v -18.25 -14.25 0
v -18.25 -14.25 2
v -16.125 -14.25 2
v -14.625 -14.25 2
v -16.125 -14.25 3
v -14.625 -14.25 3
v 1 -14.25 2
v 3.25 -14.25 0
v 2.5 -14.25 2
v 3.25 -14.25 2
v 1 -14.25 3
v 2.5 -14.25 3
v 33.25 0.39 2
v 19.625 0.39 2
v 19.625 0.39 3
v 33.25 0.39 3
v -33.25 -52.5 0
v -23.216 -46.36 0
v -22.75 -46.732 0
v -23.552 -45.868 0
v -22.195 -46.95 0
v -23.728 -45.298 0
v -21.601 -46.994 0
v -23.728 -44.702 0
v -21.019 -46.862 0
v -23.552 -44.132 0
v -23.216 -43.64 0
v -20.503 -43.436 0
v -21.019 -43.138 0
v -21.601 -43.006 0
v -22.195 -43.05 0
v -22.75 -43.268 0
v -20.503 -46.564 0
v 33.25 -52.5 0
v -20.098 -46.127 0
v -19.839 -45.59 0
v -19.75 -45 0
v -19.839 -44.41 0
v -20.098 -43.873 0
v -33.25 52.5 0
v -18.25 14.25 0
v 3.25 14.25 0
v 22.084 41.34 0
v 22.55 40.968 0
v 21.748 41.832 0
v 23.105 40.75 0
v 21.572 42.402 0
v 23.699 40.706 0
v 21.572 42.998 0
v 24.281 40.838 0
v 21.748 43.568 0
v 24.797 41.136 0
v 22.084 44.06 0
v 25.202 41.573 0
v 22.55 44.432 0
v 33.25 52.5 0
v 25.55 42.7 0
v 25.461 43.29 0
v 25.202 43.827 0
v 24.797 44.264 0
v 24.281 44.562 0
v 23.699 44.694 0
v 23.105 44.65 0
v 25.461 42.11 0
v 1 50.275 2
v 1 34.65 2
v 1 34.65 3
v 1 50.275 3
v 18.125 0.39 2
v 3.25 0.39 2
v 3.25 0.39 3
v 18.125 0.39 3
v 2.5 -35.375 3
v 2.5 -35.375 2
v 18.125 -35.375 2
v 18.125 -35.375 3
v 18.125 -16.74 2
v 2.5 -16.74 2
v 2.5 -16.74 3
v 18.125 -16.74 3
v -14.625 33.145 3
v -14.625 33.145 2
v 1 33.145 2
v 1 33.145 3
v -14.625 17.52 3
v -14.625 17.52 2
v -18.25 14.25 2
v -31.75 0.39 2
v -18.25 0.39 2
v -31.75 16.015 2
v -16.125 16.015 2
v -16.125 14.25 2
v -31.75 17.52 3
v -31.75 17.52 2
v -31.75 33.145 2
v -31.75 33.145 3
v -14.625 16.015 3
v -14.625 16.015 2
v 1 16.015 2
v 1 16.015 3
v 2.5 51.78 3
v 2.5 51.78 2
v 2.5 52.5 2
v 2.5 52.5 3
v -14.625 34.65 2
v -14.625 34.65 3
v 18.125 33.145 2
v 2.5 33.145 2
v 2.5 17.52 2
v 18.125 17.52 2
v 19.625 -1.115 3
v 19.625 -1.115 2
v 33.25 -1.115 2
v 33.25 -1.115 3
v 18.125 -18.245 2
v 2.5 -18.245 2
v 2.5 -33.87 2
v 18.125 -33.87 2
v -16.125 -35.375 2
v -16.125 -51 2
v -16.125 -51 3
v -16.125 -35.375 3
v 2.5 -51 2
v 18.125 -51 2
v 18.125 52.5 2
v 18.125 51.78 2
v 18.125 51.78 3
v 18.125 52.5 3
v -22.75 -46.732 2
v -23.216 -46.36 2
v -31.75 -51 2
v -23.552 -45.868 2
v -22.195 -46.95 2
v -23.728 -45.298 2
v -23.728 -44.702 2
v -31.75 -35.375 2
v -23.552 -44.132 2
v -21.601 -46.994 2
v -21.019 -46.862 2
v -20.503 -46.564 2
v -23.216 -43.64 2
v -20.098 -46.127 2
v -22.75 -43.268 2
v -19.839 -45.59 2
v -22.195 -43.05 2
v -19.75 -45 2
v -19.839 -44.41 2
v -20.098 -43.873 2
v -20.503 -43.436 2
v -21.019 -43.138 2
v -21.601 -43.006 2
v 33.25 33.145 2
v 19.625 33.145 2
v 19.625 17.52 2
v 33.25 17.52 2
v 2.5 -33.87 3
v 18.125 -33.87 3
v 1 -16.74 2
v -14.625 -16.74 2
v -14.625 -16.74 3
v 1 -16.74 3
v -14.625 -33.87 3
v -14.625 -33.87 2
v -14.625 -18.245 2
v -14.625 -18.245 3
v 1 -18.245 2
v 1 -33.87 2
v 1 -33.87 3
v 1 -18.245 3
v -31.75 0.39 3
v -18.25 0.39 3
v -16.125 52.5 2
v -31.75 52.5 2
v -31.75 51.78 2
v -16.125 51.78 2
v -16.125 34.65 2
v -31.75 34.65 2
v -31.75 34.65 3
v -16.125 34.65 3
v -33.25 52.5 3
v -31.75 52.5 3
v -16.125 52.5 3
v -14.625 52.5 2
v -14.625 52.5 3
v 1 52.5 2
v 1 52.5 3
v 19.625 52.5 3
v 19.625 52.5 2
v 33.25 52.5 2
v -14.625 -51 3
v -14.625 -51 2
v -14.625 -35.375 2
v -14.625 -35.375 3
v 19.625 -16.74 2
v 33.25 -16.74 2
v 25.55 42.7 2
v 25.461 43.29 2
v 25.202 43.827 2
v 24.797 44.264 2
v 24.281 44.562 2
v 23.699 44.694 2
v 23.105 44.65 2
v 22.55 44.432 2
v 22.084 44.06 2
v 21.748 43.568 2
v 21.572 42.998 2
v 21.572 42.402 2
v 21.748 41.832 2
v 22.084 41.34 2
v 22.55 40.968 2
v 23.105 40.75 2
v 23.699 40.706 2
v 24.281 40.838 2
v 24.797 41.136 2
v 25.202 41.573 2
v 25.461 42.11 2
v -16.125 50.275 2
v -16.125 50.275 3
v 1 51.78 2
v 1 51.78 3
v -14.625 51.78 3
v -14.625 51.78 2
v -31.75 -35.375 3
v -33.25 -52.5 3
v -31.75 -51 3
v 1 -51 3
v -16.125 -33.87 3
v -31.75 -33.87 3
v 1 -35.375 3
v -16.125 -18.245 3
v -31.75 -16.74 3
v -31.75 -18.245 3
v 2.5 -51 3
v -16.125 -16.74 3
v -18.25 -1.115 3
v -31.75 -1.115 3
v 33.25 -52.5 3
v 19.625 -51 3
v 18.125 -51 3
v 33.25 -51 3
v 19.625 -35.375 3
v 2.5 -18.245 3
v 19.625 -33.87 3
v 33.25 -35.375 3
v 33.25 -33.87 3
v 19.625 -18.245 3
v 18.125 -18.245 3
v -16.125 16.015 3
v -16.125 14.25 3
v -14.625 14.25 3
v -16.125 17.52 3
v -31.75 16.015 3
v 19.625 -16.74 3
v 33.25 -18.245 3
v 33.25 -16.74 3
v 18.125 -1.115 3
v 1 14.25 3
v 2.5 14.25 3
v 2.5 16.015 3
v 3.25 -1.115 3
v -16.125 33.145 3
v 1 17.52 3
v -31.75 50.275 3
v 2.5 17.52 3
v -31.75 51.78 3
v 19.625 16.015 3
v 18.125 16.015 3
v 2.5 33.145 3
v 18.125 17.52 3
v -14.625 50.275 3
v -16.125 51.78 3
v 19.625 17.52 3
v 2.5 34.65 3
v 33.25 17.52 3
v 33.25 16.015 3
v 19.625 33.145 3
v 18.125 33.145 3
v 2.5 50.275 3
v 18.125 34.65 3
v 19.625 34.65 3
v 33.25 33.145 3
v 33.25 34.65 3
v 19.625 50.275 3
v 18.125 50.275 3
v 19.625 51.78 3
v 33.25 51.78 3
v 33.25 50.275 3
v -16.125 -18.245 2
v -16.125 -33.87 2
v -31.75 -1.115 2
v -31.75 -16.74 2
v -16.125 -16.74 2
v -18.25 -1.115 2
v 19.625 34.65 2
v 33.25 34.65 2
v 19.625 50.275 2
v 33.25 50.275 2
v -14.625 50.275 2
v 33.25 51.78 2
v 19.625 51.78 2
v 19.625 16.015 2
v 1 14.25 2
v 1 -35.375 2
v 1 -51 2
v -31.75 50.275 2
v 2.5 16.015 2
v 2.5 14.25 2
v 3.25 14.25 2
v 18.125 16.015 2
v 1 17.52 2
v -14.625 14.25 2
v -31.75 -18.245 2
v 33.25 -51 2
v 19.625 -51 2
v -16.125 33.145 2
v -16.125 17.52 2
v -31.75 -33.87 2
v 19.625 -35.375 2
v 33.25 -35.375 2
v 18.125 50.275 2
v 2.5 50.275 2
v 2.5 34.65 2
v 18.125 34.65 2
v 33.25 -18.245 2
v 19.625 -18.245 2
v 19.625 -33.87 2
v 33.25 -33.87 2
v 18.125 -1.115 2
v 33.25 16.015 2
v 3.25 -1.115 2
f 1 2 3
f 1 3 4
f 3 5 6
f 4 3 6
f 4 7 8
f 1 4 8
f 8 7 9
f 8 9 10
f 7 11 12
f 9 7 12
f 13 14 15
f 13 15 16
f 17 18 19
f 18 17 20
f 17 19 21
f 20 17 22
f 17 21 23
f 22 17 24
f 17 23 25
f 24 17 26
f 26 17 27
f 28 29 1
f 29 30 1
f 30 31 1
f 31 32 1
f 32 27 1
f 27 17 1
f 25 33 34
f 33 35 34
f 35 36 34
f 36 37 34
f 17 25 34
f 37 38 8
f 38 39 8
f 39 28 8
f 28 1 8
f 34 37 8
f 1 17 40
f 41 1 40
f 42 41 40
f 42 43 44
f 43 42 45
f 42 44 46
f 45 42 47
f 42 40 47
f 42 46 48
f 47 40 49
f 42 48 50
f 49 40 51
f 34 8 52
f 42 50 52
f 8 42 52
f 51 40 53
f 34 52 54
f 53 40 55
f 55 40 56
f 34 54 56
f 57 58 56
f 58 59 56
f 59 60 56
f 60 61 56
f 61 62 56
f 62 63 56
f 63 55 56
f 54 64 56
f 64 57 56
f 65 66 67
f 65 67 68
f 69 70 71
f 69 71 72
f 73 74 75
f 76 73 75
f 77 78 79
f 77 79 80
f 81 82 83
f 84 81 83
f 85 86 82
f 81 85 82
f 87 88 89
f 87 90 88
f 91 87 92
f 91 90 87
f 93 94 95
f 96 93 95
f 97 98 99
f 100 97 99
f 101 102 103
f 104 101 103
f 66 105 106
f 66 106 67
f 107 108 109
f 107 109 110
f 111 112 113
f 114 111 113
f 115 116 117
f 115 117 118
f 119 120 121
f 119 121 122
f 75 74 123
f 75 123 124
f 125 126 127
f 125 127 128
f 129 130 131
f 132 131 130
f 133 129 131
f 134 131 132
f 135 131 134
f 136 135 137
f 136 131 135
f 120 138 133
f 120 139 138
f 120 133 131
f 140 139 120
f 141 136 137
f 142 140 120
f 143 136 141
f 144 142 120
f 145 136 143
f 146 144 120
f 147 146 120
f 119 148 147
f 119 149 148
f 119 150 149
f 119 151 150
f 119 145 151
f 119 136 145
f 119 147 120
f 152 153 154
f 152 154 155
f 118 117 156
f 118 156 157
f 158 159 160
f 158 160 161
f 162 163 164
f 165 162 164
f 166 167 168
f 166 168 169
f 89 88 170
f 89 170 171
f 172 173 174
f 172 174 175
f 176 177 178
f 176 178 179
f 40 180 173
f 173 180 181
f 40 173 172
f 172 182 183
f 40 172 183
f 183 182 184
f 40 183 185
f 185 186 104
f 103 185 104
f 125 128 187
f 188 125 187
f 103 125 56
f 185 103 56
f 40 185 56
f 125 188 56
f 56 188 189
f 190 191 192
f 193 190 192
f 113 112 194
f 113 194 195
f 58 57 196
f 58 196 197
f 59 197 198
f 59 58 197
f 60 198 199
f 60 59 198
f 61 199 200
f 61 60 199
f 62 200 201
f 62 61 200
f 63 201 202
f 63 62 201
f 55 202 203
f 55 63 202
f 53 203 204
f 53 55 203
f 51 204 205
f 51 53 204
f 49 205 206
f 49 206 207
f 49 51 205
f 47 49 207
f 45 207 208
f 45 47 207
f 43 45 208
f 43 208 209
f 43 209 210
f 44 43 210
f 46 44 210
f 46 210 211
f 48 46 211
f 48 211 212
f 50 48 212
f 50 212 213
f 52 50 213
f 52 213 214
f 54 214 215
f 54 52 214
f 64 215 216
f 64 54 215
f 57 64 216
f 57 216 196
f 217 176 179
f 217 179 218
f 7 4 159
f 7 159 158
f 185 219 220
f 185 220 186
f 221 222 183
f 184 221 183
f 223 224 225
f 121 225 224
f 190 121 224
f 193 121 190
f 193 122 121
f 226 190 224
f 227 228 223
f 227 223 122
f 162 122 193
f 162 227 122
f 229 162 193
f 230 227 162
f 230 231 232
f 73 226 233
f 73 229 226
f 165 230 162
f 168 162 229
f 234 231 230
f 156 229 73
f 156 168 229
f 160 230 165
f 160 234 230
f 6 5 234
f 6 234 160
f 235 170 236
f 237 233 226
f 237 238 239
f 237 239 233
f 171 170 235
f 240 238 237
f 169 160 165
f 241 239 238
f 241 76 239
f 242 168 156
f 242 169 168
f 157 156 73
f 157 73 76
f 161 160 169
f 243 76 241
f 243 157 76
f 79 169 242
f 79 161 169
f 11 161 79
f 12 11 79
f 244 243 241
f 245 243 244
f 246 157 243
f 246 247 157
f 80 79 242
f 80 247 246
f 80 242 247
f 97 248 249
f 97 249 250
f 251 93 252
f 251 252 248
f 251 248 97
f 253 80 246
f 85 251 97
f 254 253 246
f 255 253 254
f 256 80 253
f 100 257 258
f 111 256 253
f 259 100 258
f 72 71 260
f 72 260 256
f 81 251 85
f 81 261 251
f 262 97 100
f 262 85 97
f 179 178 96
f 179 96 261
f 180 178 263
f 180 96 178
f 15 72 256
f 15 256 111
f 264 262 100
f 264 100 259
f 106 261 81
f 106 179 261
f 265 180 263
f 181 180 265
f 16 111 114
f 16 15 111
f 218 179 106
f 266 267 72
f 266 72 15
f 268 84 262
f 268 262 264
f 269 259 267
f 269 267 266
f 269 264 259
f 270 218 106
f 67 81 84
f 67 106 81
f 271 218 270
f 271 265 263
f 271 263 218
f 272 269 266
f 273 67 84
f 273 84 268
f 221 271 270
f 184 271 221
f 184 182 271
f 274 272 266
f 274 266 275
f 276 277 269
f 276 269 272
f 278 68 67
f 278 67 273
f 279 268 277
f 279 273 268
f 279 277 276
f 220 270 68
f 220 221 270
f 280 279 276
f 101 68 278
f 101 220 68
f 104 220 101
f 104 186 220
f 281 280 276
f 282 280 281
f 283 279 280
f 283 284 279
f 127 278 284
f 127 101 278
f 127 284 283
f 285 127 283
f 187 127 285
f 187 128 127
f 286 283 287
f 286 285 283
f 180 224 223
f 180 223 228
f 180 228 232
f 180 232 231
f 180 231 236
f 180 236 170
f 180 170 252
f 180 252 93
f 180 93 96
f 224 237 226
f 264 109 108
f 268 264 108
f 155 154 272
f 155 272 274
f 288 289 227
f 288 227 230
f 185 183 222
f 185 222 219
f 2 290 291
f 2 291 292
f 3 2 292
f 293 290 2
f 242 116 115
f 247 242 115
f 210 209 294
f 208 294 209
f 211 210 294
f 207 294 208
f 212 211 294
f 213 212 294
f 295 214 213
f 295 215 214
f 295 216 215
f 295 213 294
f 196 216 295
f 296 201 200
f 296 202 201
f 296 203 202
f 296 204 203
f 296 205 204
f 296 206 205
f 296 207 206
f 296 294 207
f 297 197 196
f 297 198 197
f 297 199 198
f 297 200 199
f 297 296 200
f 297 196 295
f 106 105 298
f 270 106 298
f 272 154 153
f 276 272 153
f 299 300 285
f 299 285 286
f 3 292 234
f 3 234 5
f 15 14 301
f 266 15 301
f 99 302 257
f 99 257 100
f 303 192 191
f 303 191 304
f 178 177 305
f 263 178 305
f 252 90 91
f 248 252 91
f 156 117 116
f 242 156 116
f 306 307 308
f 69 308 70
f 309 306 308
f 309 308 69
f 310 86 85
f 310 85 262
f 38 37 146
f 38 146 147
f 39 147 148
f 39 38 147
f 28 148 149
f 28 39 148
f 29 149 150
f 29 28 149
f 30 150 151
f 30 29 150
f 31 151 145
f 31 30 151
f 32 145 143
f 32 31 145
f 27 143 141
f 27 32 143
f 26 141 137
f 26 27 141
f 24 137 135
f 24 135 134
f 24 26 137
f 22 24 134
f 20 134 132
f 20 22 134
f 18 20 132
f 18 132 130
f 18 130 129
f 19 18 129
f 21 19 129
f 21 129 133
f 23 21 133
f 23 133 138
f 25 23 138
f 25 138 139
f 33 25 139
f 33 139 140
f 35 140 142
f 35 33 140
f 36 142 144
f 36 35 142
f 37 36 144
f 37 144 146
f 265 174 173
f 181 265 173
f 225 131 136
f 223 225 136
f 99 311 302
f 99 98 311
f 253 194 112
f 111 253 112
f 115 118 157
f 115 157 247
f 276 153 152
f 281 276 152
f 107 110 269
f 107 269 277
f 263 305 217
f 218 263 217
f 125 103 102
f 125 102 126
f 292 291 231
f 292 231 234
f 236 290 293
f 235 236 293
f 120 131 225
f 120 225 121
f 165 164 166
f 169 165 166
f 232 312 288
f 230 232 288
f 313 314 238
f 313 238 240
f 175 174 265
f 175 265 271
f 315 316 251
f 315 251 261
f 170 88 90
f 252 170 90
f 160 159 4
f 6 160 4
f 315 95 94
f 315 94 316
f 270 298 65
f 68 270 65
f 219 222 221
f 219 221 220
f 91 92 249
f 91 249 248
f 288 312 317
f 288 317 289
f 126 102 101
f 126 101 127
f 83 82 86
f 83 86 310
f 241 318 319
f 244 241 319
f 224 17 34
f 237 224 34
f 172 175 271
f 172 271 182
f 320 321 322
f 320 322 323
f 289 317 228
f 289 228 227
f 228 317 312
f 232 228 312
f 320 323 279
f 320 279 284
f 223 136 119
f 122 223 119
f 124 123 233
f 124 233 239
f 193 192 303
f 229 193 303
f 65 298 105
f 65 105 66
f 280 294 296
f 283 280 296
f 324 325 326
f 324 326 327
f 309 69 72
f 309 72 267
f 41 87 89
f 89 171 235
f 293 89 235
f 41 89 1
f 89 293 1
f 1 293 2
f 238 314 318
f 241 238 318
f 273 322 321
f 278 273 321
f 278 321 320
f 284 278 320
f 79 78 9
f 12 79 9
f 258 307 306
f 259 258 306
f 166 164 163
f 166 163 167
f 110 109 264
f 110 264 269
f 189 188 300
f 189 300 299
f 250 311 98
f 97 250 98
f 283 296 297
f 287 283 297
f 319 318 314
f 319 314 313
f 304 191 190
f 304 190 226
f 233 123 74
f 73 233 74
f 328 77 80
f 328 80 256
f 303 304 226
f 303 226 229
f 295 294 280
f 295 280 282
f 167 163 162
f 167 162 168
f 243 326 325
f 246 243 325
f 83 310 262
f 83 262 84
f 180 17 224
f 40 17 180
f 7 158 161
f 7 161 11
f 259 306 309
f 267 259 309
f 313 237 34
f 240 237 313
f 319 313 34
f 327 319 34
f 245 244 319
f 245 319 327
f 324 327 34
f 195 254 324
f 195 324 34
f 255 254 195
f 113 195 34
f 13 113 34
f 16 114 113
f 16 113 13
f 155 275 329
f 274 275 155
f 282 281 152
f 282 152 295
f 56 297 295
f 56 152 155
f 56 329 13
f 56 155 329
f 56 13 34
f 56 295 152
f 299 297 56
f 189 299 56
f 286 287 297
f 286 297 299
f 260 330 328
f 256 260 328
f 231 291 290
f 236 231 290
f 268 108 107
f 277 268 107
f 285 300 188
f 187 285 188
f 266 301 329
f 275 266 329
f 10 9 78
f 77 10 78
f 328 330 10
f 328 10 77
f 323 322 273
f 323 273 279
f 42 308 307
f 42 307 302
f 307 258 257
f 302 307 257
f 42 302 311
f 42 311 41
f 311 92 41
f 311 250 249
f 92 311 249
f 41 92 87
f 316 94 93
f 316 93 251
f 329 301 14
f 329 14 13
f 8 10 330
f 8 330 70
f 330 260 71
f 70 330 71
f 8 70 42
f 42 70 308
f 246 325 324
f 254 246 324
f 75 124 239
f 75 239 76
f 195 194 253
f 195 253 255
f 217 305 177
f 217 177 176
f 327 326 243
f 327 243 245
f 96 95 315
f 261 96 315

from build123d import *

# Parameters (mm, degrees)
SKETCH_W                      = 66.5
SKETCH_H                      = 105
SKETCH_R                      = 2
SKETCH_W_2                    = 21.5
SKETCH_H_2                    = 28.5
PAD_DEPTH                     = 2
SKETCH002_W                   = 18.625
SKETCH002_H                   = 18.625
SKETCH002_W_2                 = 15.625
SKETCH002_H_2                 = 15.625
PAD002_DEPTH                  = 1
SKETCH002_LINEARPATTERN_2_W   = 18.625
SKETCH002_LINEARPATTERN_2_H   = 18.625
SKETCH002_LINEARPATTERN_2_W_2 = 15.625
SKETCH002_LINEARPATTERN_2_H_2 = 15.625
PAD002_LINEARPATTERN_2_DEPTH  = 1
SKETCH002_LINEARPATTERN_3_W   = 18.625
SKETCH002_LINEARPATTERN_3_H   = 18.625
SKETCH002_LINEARPATTERN_3_W_2 = 15.625
SKETCH002_LINEARPATTERN_3_H_2 = 15.625
PAD002_LINEARPATTERN_3_DEPTH  = 1
SKETCH002_LINEARPATTERN_4_W   = 18.625
SKETCH002_LINEARPATTERN_4_H   = 18.625
SKETCH002_LINEARPATTERN_4_W_2 = 15.625
SKETCH002_LINEARPATTERN_4_H_2 = 15.625
PAD002_LINEARPATTERN_4_DEPTH  = 1
LINEARPATTERN002_COUNT        = 9
LINEARPATTERN002_PITCH        = 17.13
SKETCH003_W                   = 150.48745
SKETCH003_H                   = 190.076035
SKETCH003_W_2                 = 66.5
SKETCH003_H_2                 = 105
POCKET_DEPTH                  = 5


with BuildPart() as part:
    # Sketch (on XY_Plane of Origin) → Pad (new body)
    with BuildSketch(Plane.XY):
        Rectangle(SKETCH_W, SKETCH_H)
        with Locations((-21.75, -45)):
            Circle(SKETCH_R, mode=Mode.SUBTRACT)
        with Locations((23.55, 42.7)):
            Circle(SKETCH_R, mode=Mode.SUBTRACT)
        with Locations((-7.5, 0)):
            Rectangle(SKETCH_W_2, SKETCH_H_2, mode=Mode.SUBTRACT)
    extrude(amount=PAD_DEPTH)

    # Sketch002 (on Face12 of Pad) → Pad002 (join)
    with BuildSketch(Plane.XY.offset(2)):
        with Locations((-23.9375, -43.1875)):
            Rectangle(SKETCH002_W, SKETCH002_H)
        with Locations((-23.9375, -43.1875)):
            Rectangle(SKETCH002_W_2, SKETCH002_H_2, mode=Mode.SUBTRACT)
    pad002 = extrude(amount=PAD002_DEPTH)

    # Sketch002 LinearPattern 2 → Pad002 LinearPattern 2 (add)
    with BuildSketch(Plane(origin=(17.125, 0, 2), x_dir=(1, 0, 0), z_dir=(0, 0, 1))):
        with Locations((-23.9375, -43.1875)):
            Rectangle(SKETCH002_LINEARPATTERN_2_W, SKETCH002_LINEARPATTERN_2_H)
        with Locations((-23.9375, -43.1875)):
            Rectangle(SKETCH002_LINEARPATTERN_2_W_2, SKETCH002_LINEARPATTERN_2_H_2, mode=Mode.SUBTRACT)
    pad002_linearpattern_2 = extrude(amount=PAD002_LINEARPATTERN_2_DEPTH)

    # Sketch002 LinearPattern 3 → Pad002 LinearPattern 3 (add)
    with BuildSketch(Plane(origin=(34.25, 0, 2), x_dir=(1, 0, 0), z_dir=(0, 0, 1))):
        with Locations((-23.9375, -43.1875)):
            Rectangle(SKETCH002_LINEARPATTERN_3_W, SKETCH002_LINEARPATTERN_3_H)
        with Locations((-23.9375, -43.1875)):
            Rectangle(SKETCH002_LINEARPATTERN_3_W_2, SKETCH002_LINEARPATTERN_3_H_2, mode=Mode.SUBTRACT)
    pad002_linearpattern_3 = extrude(amount=PAD002_LINEARPATTERN_3_DEPTH)

    # Sketch002 LinearPattern 4 → Pad002 LinearPattern 4 (add)
    with BuildSketch(Plane(origin=(51.375, 0, 2), x_dir=(1, 0, 0), z_dir=(0, 0, 1))):
        with Locations((-23.9375, -43.1875)):
            Rectangle(SKETCH002_LINEARPATTERN_4_W, SKETCH002_LINEARPATTERN_4_H)
        with Locations((-23.9375, -43.1875)):
            Rectangle(SKETCH002_LINEARPATTERN_4_W_2, SKETCH002_LINEARPATTERN_4_H_2, mode=Mode.SUBTRACT)
    pad002_linearpattern_4 = extrude(amount=PAD002_LINEARPATTERN_4_DEPTH)

    # LinearPattern002: Pad002, Pad002 LinearPattern 2, Pad002 LinearPattern 3, Pad002 LinearPattern 4 ×9
    with Locations(*[(0, i * LINEARPATTERN002_PITCH, 0) for i in range(1, LINEARPATTERN002_COUNT)]):
        add(pad002)
        add(pad002_linearpattern_2)
        add(pad002_linearpattern_3)
        add(pad002_linearpattern_4)

    # Sketch003 (on Face131 of MultiTransform) → Pocket (cut)
    with BuildSketch(Plane.XY.offset(3)):
        with Locations((-0.924236, 18.80619)):
            Rectangle(SKETCH003_W, SKETCH003_H)
        Rectangle(SKETCH003_W_2, SKETCH003_H_2, mode=Mode.SUBTRACT)
        Polygon((-16.125, 14.25), (-14.625, 14.25), (1, 14.25), (2.5, 14.25), (3.25, 14.25), (3.25, 0.39), (3.25, -1.115), (3.25, -14.25), (2.5, -14.25), (1, -14.25), (-14.625, -14.25), (-16.125, -14.25), (-18.25, -14.25), (-18.25, -1.115), (-18.25, 0.39), (-18.25, 14.25), align=None)
    extrude(amount=-POCKET_DEPTH, mode=Mode.SUBTRACT)


solid = part.part
